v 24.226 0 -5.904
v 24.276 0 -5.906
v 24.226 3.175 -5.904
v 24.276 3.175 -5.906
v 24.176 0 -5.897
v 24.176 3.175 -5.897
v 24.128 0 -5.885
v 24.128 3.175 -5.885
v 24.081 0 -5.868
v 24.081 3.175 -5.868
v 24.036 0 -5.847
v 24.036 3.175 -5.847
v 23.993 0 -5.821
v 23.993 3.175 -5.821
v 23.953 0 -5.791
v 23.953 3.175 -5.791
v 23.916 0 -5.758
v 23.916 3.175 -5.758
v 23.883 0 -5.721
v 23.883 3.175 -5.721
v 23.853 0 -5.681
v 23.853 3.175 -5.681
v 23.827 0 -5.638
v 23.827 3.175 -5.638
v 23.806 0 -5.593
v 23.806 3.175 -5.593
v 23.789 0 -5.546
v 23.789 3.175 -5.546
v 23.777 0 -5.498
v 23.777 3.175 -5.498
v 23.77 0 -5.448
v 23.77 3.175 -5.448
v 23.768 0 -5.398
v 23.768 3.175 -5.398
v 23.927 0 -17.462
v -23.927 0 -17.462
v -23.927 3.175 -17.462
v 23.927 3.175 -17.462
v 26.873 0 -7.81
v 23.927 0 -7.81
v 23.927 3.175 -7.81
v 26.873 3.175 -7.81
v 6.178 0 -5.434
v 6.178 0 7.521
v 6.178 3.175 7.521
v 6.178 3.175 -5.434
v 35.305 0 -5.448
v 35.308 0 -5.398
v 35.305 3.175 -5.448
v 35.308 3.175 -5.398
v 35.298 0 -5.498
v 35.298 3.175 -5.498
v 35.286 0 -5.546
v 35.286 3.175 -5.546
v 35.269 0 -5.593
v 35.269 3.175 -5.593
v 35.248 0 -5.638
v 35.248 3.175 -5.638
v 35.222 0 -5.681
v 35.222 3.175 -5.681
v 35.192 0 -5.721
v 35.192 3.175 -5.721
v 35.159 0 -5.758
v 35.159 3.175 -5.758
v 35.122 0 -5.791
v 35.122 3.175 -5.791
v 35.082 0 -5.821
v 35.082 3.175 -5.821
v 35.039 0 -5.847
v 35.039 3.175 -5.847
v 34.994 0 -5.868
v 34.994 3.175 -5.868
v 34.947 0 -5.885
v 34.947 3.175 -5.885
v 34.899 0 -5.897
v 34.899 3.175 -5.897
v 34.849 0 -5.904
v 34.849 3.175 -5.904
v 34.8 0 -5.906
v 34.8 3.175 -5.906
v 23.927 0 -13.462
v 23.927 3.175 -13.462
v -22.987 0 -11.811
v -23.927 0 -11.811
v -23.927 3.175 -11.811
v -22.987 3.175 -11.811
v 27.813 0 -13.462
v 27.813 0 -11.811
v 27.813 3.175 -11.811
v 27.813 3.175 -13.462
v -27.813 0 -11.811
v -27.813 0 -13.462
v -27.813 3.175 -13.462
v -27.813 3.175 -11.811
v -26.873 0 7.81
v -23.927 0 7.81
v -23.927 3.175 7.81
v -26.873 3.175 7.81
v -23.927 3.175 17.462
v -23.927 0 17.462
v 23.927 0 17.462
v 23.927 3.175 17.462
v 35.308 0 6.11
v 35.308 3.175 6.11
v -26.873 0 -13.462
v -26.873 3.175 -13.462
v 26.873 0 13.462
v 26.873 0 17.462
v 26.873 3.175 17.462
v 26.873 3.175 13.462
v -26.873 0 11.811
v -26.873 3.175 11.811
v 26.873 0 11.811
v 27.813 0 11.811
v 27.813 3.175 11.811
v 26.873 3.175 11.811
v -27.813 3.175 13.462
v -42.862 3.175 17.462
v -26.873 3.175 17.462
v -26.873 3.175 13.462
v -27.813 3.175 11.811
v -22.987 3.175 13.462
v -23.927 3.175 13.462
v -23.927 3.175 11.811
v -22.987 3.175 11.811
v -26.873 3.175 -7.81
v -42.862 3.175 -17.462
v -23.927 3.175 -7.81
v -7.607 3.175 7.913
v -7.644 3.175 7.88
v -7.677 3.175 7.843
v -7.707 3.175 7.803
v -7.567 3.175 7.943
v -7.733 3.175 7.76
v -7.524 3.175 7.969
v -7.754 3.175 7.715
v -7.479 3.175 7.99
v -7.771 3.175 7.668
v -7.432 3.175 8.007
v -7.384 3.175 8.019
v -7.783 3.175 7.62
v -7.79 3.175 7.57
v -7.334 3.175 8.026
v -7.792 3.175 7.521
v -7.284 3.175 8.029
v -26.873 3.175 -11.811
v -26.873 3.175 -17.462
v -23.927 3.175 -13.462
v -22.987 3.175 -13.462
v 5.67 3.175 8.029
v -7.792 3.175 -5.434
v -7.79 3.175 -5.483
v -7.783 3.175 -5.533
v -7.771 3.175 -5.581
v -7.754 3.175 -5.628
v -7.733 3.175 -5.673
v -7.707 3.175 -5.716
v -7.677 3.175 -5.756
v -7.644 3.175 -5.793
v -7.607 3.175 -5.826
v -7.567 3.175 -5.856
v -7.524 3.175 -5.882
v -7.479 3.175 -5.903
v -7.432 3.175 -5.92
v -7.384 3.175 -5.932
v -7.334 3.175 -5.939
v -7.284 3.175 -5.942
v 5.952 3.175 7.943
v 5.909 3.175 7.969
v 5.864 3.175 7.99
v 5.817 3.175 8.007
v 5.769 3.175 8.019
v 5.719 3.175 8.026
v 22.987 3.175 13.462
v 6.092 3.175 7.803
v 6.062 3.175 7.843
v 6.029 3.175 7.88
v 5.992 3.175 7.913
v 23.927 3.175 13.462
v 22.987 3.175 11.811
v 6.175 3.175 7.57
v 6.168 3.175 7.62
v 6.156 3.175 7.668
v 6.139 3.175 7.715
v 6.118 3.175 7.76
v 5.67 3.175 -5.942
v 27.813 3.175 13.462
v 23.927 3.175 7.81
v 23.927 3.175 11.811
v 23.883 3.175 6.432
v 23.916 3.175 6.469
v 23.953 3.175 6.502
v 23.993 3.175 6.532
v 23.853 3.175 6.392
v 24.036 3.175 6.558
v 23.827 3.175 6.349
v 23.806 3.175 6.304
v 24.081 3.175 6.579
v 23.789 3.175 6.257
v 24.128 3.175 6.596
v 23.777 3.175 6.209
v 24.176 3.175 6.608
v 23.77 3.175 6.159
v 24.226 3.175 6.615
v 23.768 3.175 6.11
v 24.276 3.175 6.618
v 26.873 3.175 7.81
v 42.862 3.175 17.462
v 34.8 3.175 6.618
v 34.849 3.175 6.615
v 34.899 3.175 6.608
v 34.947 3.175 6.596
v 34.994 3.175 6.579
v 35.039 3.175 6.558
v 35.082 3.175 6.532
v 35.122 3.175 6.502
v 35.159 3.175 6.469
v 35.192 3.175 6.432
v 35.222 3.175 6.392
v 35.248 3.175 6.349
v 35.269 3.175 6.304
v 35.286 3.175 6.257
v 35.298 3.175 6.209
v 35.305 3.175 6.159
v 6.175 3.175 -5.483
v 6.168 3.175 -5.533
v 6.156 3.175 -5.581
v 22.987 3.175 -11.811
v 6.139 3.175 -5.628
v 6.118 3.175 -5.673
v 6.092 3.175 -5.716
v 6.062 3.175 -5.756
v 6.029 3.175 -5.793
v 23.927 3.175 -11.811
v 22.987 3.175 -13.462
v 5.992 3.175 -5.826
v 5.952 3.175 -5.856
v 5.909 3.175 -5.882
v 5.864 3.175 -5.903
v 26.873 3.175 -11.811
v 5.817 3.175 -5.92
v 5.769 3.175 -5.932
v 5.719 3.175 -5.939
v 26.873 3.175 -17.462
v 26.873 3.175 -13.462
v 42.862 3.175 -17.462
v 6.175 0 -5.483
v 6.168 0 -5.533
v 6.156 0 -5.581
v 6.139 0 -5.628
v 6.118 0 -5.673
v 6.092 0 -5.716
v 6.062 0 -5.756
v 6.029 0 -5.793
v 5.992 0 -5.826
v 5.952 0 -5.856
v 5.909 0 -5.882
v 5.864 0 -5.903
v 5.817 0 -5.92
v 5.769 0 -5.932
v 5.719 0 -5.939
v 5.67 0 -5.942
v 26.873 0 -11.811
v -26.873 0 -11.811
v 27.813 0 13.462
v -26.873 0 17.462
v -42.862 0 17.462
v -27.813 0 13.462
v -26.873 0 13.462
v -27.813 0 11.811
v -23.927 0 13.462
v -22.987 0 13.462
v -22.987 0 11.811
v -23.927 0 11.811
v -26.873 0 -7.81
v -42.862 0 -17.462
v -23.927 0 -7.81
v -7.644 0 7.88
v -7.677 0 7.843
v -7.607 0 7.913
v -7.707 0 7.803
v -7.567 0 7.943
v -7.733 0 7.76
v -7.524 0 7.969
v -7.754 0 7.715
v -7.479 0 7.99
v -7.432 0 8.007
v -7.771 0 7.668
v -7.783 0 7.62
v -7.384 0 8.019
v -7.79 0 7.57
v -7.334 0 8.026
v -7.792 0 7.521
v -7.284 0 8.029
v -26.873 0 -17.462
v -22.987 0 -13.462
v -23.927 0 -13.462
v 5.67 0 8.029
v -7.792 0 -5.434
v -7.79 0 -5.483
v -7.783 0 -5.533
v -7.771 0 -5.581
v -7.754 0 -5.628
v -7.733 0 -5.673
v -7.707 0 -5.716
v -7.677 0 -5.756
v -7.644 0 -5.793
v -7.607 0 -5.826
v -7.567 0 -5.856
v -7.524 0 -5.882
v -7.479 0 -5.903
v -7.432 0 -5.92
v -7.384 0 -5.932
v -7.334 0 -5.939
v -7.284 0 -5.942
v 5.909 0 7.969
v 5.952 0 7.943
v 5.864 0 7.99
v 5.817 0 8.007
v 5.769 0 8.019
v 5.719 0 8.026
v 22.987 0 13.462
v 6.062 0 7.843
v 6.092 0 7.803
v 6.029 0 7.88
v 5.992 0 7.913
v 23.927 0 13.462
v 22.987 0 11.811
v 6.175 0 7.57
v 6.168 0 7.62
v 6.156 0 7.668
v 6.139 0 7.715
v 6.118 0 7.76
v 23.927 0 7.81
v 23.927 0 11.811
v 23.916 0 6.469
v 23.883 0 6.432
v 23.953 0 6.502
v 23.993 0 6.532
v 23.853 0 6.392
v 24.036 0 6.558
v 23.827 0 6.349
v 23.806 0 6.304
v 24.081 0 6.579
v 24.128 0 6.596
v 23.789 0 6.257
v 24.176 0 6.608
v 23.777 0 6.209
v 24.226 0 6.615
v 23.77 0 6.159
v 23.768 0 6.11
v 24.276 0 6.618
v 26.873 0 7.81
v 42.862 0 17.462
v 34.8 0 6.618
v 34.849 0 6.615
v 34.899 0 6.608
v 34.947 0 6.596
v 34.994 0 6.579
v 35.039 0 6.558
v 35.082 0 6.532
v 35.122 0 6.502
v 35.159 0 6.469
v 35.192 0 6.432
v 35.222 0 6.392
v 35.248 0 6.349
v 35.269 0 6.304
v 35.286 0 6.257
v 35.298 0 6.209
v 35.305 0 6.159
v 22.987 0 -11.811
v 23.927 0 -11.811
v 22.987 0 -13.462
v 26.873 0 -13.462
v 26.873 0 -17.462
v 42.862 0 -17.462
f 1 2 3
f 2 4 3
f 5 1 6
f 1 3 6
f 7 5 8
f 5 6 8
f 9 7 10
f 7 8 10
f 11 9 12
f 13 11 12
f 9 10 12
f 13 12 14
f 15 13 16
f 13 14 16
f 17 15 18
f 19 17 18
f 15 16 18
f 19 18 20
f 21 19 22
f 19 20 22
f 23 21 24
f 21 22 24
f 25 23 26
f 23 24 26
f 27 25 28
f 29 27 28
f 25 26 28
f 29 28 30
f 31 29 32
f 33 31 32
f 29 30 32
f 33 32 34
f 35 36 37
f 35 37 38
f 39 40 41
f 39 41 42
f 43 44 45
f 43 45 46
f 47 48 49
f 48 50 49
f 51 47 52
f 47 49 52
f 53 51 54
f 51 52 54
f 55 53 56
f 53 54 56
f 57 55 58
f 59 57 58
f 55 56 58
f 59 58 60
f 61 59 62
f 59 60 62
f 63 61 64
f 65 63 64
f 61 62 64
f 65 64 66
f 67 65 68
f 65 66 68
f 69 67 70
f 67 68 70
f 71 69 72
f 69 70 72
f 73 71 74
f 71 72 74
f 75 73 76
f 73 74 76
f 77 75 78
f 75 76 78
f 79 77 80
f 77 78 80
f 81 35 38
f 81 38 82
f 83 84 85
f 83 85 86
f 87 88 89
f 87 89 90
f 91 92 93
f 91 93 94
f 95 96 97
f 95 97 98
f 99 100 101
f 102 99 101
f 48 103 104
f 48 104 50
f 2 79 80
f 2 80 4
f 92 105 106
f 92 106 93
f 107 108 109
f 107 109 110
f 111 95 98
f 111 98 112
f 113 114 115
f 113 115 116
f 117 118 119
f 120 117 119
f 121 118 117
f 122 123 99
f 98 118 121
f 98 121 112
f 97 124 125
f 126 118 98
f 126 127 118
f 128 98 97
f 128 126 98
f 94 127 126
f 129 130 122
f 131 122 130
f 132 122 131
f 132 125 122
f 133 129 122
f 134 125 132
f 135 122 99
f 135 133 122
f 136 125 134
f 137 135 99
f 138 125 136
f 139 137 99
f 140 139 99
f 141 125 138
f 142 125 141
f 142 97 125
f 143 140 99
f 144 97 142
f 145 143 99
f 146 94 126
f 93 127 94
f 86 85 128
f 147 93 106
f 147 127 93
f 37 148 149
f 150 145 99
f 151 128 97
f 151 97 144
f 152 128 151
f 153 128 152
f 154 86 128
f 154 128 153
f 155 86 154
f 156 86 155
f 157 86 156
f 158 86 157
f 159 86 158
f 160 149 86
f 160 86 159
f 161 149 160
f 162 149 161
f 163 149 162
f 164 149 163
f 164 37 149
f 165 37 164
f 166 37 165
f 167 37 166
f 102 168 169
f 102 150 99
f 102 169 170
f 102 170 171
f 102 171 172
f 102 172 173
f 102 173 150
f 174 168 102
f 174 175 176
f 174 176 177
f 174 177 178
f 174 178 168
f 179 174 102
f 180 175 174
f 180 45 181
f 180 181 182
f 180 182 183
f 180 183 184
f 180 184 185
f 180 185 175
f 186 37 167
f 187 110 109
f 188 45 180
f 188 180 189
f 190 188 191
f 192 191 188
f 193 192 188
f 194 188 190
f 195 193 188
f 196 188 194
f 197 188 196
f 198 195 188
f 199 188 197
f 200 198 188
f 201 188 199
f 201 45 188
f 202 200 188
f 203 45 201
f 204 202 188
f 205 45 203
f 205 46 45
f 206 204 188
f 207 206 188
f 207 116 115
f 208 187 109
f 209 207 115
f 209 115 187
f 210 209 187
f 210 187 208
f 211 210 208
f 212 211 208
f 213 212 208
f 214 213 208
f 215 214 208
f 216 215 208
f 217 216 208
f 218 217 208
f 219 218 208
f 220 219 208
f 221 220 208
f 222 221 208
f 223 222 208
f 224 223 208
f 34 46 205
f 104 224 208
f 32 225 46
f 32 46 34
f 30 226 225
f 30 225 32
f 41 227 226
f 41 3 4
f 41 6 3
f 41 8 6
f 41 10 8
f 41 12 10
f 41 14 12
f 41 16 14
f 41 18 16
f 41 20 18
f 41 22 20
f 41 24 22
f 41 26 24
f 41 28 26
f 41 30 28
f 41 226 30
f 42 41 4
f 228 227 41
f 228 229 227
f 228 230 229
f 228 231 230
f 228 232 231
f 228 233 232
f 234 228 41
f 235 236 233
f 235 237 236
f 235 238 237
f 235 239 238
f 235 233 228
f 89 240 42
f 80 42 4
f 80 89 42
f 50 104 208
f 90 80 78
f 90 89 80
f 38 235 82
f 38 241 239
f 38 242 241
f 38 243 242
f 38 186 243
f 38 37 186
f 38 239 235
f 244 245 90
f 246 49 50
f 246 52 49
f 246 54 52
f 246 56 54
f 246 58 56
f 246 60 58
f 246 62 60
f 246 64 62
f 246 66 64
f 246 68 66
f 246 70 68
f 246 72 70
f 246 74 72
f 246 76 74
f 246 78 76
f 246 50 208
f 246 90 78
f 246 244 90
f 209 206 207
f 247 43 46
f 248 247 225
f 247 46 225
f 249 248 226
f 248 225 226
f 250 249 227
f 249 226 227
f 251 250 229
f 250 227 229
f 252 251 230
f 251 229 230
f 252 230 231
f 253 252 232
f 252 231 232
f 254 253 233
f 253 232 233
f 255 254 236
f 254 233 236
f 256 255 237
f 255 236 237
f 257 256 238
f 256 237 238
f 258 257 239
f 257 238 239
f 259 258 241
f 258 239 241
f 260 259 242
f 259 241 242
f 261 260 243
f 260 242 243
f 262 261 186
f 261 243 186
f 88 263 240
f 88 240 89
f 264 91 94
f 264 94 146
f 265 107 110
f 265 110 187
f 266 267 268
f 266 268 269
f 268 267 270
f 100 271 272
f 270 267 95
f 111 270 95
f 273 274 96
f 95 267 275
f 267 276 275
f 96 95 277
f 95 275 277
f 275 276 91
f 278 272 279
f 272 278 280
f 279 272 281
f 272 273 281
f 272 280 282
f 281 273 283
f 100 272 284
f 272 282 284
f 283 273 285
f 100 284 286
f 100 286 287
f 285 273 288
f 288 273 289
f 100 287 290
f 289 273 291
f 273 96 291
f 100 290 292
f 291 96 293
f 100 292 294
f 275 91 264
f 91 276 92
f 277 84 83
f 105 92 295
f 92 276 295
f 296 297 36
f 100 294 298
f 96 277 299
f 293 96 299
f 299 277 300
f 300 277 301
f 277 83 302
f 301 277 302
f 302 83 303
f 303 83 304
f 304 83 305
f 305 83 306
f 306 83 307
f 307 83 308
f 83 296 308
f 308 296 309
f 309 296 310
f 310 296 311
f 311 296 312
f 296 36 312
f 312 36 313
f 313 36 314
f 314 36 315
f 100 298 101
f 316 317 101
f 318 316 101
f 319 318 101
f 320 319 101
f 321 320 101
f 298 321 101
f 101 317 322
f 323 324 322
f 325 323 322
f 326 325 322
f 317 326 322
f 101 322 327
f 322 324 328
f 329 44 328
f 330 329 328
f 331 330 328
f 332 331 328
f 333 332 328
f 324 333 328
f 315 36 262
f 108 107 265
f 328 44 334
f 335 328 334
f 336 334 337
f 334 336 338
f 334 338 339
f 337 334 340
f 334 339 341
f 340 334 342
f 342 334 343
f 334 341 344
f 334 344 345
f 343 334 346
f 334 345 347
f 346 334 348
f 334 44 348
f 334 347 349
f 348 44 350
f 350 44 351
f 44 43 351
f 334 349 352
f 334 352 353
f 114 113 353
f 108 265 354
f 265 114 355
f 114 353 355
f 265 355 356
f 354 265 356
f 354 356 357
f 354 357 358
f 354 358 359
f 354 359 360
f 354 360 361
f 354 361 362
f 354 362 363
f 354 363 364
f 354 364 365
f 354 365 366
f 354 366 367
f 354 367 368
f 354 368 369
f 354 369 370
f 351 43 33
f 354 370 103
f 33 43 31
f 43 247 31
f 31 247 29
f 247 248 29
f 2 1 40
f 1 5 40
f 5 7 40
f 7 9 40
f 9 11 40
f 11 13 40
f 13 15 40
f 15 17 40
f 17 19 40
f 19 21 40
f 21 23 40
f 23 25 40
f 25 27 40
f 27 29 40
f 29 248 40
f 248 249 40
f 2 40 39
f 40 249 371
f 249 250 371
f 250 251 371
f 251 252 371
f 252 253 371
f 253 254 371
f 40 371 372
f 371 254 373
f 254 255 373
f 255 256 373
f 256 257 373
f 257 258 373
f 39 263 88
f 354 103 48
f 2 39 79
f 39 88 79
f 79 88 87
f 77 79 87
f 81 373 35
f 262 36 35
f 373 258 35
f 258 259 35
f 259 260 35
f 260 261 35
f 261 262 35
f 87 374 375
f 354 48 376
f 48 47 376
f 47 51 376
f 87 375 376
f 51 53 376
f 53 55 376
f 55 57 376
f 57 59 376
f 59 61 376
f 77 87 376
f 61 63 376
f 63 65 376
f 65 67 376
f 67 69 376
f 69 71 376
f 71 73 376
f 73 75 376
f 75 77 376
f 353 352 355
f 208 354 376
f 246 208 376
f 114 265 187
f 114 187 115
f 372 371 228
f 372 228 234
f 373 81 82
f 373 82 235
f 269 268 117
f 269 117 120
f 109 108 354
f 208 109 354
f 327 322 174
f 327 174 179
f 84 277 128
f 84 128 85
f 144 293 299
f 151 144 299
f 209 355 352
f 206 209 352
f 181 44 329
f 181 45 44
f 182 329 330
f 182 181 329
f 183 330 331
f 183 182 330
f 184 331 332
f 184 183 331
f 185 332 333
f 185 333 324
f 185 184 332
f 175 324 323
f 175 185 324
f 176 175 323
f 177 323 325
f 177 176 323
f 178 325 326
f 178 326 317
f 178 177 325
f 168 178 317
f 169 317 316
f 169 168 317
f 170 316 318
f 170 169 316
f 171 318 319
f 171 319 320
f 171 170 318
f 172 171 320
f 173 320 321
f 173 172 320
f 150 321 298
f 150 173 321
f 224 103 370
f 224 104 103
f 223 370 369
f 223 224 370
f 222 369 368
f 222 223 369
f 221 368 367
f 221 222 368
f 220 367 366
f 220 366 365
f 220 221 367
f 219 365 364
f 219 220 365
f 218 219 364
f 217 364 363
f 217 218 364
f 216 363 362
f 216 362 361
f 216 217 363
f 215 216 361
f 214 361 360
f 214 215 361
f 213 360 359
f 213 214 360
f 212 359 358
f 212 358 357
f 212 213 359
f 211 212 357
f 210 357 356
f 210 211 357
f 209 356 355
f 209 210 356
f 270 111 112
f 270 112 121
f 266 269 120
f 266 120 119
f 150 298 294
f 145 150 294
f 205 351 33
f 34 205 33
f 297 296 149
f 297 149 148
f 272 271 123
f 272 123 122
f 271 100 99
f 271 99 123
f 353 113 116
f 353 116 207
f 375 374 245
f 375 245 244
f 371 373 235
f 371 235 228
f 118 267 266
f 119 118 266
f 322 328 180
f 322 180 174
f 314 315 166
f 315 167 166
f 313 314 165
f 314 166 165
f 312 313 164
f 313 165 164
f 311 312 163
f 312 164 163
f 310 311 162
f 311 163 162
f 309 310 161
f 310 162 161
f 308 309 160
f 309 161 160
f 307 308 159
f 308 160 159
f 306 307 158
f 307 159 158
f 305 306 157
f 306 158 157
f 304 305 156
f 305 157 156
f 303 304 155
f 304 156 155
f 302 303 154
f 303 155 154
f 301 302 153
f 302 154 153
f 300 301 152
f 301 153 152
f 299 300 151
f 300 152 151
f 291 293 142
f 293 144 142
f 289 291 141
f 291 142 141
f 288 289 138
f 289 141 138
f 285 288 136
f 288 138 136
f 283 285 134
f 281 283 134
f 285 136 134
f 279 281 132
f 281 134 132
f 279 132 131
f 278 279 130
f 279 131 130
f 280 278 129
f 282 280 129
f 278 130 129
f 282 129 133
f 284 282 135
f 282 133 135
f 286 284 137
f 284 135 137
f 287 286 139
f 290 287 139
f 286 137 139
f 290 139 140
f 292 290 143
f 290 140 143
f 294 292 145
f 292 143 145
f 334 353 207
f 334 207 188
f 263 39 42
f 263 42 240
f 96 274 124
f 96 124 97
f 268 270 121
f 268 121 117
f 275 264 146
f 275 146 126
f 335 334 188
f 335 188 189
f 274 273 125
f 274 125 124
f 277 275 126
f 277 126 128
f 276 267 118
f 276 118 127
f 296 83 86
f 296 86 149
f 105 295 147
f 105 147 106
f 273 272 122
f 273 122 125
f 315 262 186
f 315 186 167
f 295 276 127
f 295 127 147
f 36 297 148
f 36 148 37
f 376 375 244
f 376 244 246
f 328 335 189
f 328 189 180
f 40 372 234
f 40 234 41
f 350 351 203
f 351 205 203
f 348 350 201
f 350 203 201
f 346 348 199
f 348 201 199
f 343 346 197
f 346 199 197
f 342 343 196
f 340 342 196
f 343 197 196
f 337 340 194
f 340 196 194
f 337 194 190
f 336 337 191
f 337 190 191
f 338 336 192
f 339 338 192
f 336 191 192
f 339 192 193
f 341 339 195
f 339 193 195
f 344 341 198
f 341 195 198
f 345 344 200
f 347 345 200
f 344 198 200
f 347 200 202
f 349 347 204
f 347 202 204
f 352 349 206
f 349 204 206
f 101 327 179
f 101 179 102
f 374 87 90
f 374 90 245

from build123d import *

# Parameters (mm, degrees)
SKETCH1_W           = 85.725
SKETCH1_H           = 34.925
BOSS_EXTRUDE1_DEPTH = 3.175
SKETCH2_W           = 13.97
SKETCH2_H           = 13.97
SKETCH2_W_2         = 11.54
SKETCH2_H_2         = 12.524
CUT_EXTRUDE1_DEPTH  = 47.391954448
FILLET1_R           = 0.508
CUT_EXTRUDE2_DEPTH  = 47.391954448


with BuildPart() as part:
    # Sketch1 → Boss-Extrude1 (new body)
    with BuildSketch(Plane(origin=(0, 0, 0), x_dir=(1, 0, 0), z_dir=(0, 1, 0))):
        Rectangle(SKETCH1_W, SKETCH1_H)
    extrude(amount=BOSS_EXTRUDE1_DEPTH)

    # Sketch2 → Cut-Extrude1 (cut, through all)
    with BuildSketch(Plane(origin=(0, 0, 0), x_dir=(-1, 0, 0), z_dir=(0, -1, 0))):
        with Locations((0.8075, -1.0435)):
            Rectangle(SKETCH2_W, SKETCH2_H)
        with Locations((-29.5375, -0.3555)):
            Rectangle(SKETCH2_W_2, SKETCH2_H_2)
    extrude(amount=-CUT_EXTRUDE1_DEPTH, mode=Mode.SUBTRACT)

    # Fillet1
    fillet1_edges = [part.edges().sort_by_distance(p)[0] for p in [
        (6.1775, 1.5875, 8.0285),
        (6.1775, 1.5875, -5.9415),
        (-7.7925, 1.5875, -5.9415),
        (-7.7925, 1.5875, 8.0285),
        (23.7675, 1.5875, -5.9065),
        (23.7675, 1.5875, 6.6175),
        (35.3075, 1.5875, 6.6175),
        (35.3075, 1.5875, -5.9065),
    ]]
    fillet(fillet1_edges, radius=FILLET1_R)

    # Sketch3 → Cut-Extrude2 (cut, through all)
    with BuildSketch(Plane.XZ):
        Polygon((-26.8732, 17.4625), (-23.9268, 17.4625), (-23.9268, 13.462), (-22.987, 13.462), (-22.987, 11.811), (-23.9268, 11.811), (-23.9268, 7.8105), (-26.8732, 7.8105), (-26.8732, 11.811), (-27.813, 11.811), (-27.813, 13.462), (-26.8732, 13.462), align=None)
        Polygon((26.8732, 11.811), (26.8732, 7.8105), (23.9268, 7.8105), (23.9268, 11.811), (22.987, 11.811), (22.987, 13.462), (23.9268, 13.462), (23.9268, 17.4625), (26.8732, 17.4625), (26.8732, 13.462), (27.813, 13.462), (27.813, 11.811), align=None)
        Polygon((26.8732, -17.4625), (23.9268, -17.4625), (23.9268, -13.462), (22.987, -13.462), (22.987, -11.811), (23.9268, -11.811), (23.9268, -7.8105), (26.8732, -7.8105), (26.8732, -11.811), (27.813, -11.811), (27.813, -13.462), (26.8732, -13.462), align=None)
        Polygon((-26.8732, -11.811), (-26.8732, -7.8105), (-23.9268, -7.8105), (-23.9268, -11.811), (-22.987, -11.811), (-22.987, -13.462), (-23.9268, -13.462), (-23.9268, -17.4625), (-26.8732, -17.4625), (-26.8732, -13.462), (-27.813, -13.462), (-27.813, -11.811), align=None)
    extrude(amount=-CUT_EXTRUDE2_DEPTH, mode=Mode.SUBTRACT)


solid = part.part
